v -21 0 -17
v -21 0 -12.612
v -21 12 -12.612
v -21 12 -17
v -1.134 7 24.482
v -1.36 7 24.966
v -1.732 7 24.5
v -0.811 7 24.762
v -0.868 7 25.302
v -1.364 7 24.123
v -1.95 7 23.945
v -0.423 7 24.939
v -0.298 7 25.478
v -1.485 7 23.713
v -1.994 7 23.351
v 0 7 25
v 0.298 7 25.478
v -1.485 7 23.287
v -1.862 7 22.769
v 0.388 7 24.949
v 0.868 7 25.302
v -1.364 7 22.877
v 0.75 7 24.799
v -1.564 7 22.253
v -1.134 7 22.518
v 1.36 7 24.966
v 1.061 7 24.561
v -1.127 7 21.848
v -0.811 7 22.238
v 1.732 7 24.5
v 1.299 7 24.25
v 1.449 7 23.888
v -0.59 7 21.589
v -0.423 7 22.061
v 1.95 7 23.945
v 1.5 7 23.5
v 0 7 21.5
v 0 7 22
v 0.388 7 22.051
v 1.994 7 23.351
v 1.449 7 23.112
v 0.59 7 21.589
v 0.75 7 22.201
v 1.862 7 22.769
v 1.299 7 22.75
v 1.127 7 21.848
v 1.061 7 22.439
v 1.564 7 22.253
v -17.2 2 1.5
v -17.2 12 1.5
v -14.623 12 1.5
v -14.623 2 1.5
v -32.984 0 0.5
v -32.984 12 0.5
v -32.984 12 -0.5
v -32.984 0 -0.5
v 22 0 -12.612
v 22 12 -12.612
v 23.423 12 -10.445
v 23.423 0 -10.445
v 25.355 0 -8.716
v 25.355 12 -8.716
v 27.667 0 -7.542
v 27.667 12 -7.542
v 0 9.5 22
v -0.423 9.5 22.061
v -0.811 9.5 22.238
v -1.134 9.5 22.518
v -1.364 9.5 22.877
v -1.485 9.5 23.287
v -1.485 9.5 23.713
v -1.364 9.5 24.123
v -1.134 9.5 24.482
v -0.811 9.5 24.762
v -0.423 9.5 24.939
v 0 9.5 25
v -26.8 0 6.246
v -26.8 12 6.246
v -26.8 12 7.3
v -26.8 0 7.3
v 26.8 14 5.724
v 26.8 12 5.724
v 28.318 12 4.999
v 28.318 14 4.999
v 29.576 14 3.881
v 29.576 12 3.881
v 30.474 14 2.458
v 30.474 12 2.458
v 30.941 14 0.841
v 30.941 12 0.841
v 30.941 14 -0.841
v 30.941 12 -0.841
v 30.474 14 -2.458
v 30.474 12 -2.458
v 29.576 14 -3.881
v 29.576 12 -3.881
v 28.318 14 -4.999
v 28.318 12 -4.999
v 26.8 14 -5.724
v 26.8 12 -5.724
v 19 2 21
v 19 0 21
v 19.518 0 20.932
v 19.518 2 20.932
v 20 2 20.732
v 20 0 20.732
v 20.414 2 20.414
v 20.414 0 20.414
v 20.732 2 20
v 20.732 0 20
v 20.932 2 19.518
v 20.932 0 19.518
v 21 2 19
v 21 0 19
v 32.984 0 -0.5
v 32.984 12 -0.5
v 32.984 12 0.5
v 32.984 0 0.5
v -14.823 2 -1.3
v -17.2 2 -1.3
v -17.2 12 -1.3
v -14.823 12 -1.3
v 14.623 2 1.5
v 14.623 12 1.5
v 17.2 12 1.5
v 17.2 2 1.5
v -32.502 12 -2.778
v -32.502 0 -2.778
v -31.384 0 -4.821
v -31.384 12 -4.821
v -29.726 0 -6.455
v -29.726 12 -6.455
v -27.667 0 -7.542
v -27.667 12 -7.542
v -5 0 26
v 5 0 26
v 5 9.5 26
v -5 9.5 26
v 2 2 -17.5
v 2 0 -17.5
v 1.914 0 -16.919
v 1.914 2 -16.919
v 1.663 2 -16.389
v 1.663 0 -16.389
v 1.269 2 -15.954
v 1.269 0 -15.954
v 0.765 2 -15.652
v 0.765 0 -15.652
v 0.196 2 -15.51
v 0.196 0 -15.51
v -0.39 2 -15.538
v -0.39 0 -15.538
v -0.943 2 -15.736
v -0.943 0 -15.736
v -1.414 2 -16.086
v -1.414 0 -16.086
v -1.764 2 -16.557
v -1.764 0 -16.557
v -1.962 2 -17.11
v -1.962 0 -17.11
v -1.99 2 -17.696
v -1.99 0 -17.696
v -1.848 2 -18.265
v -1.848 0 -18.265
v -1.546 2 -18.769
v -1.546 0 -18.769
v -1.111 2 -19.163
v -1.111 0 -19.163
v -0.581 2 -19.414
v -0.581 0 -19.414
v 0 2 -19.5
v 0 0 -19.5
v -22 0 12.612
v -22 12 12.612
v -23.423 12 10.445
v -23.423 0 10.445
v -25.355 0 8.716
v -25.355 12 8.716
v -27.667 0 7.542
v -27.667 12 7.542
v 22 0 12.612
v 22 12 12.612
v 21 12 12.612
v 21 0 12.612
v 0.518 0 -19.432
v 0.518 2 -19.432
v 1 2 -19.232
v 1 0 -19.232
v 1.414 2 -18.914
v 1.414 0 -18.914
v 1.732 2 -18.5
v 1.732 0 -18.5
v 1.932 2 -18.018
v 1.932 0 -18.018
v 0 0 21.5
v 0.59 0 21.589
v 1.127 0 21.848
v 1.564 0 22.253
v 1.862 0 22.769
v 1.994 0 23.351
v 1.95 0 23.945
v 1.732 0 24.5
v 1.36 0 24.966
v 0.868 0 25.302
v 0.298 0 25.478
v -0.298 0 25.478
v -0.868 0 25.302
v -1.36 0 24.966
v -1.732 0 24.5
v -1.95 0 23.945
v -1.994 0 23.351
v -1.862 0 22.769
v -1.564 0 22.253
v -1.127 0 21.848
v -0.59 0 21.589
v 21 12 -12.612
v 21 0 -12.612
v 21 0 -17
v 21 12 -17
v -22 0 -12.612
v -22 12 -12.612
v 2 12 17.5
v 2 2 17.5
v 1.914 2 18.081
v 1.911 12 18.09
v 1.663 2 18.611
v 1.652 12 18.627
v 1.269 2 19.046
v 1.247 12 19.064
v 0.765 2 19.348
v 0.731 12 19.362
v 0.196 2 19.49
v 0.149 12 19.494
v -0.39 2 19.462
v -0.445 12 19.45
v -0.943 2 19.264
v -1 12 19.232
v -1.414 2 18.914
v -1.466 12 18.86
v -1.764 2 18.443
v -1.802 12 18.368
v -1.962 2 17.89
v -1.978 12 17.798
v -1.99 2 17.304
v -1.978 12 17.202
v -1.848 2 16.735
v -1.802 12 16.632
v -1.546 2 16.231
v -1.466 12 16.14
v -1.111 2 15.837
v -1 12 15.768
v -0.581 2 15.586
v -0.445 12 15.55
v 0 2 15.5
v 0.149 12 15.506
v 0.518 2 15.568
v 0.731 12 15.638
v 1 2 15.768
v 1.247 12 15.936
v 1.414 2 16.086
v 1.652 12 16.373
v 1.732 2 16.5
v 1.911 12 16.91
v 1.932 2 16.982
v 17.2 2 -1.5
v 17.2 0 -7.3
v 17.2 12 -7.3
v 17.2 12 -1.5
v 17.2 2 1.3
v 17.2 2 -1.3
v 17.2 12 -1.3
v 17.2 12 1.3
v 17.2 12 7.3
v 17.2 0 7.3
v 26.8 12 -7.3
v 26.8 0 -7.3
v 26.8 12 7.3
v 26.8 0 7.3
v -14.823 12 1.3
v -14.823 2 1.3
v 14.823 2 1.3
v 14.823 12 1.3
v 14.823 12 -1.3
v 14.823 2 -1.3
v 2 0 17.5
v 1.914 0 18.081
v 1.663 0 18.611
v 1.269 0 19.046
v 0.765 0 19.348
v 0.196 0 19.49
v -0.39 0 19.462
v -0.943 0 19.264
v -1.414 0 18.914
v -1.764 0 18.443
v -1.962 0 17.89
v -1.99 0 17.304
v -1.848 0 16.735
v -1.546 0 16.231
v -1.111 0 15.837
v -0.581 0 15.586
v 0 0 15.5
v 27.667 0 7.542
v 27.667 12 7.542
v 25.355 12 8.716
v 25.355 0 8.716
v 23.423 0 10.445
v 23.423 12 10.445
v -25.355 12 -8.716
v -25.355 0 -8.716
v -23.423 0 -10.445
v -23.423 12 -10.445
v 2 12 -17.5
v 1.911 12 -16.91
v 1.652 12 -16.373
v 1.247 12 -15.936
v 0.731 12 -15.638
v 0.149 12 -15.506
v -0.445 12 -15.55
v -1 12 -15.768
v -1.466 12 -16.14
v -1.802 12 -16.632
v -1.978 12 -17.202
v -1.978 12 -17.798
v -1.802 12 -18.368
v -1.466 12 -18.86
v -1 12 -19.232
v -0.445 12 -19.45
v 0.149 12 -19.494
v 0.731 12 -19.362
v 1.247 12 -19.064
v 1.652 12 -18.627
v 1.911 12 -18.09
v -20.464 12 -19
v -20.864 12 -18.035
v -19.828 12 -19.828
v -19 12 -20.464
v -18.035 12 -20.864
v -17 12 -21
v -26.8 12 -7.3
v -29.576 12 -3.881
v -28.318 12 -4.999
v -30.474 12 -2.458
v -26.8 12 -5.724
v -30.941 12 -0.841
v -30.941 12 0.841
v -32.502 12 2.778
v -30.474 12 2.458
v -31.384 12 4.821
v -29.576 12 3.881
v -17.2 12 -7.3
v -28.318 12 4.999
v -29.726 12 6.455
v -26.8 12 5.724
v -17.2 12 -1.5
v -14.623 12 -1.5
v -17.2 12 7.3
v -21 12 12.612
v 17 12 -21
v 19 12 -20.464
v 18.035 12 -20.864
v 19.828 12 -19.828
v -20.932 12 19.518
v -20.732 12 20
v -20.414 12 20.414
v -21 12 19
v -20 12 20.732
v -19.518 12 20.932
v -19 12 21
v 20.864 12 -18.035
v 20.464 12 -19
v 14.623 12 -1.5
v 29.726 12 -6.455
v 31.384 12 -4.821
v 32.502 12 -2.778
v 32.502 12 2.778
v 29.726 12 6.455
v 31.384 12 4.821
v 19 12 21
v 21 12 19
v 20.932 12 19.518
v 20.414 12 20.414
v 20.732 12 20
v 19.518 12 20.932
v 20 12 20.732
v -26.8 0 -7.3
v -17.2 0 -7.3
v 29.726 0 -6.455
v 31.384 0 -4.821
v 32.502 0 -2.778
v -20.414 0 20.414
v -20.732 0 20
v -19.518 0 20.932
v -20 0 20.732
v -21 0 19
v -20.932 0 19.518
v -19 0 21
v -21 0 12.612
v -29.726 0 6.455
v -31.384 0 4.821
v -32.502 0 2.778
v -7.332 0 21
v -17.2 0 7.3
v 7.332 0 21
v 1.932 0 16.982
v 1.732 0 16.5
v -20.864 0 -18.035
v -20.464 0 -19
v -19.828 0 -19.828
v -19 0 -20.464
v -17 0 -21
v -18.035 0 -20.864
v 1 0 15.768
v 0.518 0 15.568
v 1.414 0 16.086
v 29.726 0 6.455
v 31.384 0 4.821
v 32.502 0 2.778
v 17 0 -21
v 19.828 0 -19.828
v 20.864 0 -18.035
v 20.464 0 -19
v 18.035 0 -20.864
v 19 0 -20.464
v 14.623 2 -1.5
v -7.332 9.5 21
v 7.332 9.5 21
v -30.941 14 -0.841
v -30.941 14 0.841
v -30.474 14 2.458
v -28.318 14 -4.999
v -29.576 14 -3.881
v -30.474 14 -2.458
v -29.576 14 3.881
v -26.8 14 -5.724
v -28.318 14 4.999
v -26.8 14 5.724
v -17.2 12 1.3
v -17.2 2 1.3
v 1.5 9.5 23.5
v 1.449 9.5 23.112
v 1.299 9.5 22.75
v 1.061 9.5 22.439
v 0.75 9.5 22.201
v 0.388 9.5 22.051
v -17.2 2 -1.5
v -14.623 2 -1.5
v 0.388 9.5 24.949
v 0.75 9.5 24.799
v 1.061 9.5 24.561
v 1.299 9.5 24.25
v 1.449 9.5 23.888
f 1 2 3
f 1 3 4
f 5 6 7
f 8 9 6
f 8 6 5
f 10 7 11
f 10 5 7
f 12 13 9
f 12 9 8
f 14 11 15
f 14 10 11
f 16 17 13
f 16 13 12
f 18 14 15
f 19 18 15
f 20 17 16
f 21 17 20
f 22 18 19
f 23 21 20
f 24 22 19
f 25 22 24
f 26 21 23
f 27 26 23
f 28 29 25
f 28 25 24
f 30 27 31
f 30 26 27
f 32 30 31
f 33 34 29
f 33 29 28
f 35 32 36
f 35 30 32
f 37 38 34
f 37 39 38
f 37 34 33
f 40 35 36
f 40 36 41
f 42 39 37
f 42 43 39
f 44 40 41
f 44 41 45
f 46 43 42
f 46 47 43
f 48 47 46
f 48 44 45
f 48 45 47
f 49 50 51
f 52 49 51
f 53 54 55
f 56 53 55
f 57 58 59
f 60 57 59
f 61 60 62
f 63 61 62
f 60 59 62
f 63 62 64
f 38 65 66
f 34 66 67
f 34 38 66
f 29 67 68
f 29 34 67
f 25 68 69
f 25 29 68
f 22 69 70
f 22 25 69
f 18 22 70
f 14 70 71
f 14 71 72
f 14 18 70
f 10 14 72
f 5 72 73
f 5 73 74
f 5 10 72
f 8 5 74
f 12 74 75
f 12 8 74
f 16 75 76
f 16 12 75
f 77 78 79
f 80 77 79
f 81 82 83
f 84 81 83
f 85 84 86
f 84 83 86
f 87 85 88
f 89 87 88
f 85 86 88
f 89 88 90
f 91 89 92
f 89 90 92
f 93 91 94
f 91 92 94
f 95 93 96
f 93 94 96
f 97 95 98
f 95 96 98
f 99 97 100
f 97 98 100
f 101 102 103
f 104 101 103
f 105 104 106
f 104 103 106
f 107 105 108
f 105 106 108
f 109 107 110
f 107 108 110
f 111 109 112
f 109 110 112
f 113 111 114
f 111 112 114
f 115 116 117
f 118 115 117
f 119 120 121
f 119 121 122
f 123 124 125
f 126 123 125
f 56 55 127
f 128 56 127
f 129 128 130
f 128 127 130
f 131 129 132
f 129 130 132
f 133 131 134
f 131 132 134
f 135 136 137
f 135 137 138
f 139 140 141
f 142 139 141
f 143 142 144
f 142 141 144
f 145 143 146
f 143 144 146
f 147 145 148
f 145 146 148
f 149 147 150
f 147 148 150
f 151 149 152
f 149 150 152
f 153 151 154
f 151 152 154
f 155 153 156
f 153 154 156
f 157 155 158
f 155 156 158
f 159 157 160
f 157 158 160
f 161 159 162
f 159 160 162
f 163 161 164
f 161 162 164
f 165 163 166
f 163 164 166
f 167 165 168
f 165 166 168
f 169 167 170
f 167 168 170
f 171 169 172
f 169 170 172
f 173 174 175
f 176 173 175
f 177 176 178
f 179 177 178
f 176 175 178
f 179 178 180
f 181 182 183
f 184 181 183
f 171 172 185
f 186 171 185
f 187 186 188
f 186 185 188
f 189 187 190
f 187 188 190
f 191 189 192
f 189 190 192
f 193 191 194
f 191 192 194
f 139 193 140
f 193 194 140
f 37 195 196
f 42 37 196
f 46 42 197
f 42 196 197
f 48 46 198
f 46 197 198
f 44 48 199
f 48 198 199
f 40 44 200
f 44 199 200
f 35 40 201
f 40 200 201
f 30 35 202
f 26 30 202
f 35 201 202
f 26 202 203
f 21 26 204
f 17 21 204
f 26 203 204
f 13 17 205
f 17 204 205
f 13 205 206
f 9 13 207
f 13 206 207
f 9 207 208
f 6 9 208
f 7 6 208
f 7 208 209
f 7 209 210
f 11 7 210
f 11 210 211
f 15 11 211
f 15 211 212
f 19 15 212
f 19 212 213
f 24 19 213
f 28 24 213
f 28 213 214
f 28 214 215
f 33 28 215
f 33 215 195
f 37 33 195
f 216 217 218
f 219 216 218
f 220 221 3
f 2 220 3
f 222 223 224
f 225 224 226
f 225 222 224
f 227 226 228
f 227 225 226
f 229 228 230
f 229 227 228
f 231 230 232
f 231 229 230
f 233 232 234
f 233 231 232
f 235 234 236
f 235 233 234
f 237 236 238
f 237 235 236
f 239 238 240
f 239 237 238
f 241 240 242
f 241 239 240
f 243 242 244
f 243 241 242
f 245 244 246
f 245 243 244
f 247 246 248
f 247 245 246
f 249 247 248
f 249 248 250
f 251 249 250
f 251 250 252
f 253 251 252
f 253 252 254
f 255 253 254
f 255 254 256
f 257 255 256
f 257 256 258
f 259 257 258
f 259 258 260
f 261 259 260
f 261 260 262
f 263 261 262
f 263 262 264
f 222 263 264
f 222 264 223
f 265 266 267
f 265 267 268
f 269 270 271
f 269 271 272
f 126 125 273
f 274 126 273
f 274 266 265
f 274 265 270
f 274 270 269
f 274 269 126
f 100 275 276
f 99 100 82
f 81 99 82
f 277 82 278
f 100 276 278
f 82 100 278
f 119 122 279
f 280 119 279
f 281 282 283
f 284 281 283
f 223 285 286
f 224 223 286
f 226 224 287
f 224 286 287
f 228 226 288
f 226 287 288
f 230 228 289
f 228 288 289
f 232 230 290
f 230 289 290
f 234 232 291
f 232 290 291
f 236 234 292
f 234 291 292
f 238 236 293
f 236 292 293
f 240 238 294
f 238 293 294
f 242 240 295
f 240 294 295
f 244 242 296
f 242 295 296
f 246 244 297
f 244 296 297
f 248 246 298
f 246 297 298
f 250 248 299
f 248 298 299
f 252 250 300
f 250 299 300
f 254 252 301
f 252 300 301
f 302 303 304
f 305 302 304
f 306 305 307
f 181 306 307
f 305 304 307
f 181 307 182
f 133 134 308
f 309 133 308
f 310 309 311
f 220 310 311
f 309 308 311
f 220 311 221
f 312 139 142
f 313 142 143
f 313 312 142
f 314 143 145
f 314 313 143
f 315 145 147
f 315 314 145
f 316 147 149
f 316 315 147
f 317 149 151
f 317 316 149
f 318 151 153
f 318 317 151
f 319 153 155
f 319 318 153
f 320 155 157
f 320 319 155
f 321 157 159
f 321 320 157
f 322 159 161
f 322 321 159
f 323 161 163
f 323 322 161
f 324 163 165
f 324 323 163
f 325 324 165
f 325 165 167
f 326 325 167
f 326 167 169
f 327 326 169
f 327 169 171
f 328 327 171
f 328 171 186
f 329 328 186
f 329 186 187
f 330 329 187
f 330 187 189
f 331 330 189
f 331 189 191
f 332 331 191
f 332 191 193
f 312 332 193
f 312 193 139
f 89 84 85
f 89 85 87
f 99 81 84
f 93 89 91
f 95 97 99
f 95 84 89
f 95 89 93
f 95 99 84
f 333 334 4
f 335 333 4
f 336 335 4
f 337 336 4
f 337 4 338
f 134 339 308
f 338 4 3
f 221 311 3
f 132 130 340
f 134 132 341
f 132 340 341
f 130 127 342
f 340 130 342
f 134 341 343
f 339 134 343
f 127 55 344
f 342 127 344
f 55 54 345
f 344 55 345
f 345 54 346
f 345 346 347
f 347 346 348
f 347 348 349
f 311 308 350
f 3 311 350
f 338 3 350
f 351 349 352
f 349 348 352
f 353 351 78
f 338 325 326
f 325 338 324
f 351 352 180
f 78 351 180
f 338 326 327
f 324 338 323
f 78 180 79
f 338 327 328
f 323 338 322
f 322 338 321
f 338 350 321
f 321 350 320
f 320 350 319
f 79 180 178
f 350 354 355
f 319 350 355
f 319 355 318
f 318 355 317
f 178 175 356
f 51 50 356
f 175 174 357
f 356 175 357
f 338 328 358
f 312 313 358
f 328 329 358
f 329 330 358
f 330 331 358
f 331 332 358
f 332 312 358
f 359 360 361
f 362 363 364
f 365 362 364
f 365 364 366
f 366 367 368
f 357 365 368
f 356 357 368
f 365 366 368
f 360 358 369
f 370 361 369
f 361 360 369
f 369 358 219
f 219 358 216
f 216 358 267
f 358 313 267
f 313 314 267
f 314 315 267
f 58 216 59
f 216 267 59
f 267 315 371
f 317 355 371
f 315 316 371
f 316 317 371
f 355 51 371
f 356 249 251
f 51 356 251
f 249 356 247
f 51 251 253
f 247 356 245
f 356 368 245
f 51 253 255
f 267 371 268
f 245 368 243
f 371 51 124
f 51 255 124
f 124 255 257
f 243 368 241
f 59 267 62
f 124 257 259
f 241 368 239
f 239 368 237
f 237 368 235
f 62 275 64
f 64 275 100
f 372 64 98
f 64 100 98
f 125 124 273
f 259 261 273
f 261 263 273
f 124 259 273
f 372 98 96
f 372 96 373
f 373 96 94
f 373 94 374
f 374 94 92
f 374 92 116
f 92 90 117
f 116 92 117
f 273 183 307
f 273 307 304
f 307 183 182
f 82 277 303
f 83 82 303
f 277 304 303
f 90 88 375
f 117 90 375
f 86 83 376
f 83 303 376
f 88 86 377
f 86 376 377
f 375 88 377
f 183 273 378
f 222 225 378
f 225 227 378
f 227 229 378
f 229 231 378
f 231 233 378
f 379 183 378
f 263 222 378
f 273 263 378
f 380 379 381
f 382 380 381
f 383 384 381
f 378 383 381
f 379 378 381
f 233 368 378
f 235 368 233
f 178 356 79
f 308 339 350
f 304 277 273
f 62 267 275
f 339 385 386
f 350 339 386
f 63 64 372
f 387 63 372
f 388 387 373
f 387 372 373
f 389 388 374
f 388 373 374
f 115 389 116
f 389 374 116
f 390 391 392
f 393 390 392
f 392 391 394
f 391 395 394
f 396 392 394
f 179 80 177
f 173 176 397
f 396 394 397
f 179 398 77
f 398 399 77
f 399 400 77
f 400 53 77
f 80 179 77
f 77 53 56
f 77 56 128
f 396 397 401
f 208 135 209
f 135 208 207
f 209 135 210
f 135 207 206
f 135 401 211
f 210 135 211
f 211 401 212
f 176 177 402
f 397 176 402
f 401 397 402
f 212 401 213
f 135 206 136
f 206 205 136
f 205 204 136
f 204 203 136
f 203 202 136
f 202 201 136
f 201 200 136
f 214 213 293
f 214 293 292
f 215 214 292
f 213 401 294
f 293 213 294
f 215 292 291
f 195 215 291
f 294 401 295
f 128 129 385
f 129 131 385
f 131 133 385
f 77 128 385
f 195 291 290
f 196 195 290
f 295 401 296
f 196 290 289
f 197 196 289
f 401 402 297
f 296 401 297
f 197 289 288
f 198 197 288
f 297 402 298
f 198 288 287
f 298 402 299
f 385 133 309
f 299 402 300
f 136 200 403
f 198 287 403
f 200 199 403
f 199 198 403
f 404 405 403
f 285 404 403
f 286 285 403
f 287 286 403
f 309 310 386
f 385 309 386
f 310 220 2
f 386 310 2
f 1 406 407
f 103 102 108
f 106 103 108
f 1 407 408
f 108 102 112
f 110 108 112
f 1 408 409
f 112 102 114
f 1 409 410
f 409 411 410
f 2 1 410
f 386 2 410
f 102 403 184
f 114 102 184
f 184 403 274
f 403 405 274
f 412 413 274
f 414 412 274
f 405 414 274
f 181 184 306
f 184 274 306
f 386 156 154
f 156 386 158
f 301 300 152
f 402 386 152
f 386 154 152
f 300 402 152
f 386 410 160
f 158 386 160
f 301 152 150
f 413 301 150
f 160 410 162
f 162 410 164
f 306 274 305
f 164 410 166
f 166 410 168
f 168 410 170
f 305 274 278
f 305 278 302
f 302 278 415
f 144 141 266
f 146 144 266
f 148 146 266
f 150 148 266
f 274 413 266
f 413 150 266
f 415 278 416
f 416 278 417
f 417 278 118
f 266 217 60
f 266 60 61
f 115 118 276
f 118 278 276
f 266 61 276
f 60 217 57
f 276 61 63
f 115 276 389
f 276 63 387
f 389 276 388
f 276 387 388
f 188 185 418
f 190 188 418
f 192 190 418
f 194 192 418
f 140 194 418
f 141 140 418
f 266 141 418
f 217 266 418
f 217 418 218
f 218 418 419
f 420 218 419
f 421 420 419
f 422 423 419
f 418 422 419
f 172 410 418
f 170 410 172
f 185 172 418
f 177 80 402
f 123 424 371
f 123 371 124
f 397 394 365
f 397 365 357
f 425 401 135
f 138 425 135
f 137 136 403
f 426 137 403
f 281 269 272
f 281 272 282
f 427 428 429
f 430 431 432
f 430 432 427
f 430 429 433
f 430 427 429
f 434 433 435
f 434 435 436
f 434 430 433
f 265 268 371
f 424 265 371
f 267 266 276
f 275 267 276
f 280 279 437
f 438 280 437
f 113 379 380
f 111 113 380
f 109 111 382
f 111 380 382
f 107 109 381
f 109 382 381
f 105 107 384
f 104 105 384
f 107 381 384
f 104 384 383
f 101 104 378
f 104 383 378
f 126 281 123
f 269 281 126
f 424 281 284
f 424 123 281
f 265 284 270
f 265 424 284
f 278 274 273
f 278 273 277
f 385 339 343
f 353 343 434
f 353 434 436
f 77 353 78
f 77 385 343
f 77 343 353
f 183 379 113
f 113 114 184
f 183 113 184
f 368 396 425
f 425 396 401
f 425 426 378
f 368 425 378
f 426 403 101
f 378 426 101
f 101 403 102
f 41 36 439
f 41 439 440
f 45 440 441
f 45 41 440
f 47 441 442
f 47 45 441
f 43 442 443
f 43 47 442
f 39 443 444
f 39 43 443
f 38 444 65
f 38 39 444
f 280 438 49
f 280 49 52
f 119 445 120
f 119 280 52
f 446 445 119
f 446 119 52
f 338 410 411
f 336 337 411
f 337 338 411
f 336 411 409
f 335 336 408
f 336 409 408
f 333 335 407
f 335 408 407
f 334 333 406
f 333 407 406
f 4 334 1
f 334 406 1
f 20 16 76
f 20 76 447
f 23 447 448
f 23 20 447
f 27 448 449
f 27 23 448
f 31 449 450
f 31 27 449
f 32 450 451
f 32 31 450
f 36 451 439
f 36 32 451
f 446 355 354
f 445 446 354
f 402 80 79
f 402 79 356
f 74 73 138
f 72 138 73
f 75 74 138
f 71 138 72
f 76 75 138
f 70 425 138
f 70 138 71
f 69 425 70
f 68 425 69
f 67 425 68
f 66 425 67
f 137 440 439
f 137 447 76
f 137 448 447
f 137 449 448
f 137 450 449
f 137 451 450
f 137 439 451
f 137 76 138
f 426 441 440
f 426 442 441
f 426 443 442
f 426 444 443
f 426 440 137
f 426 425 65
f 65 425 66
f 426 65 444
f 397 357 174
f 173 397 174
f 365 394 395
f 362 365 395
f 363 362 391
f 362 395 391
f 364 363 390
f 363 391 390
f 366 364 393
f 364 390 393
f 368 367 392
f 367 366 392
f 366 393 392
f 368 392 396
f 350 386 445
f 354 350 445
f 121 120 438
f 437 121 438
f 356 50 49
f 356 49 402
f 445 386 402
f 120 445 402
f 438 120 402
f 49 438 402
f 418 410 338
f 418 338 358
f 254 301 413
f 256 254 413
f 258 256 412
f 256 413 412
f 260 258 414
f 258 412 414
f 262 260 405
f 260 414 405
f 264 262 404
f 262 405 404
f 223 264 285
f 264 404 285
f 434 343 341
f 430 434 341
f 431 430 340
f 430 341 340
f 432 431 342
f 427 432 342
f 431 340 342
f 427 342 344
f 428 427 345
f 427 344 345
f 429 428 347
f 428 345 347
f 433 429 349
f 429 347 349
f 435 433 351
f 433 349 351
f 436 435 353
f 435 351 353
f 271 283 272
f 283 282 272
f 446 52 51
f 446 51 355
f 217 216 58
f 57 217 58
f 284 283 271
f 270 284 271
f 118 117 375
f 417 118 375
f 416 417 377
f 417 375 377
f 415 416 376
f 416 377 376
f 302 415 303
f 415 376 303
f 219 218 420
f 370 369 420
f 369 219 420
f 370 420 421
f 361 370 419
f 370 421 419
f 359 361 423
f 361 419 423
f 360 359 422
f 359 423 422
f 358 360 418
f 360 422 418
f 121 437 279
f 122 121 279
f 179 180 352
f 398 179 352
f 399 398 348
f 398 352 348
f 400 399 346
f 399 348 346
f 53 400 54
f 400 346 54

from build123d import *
from build123d.topology import SkipClean

# Parameters (mm, degrees)
SKETCH_1_W          = 42
SKETCH_1_H          = 42
EXTRUDE_1_DEPTH     = 2
EXTRUDE_2_DEPTH     = 0.5
SKETCH_3_R          = 2
SKETCH_3_R_2        = 1
CUT_EXTRUDE_1_DEPTH = 30.803523282
EXTRUDE_START       = -12
EXTRUDE_3_OUTLINE_R = 2
EXTRUDE_3_DEPTH     = 12
EXTRUDE_4_DEPTH     = 2
EXTRUDE_5_DEPTH     = 9.5
DRAFT_1_DEPTH       = 9.5
SKETCH_8_R          = 2
CUT_EXTRUDE_2_DEPTH = 7
CUT_EXTRUDE_3_REACH = 46.272
SKETCH_9_W          = 9.6
SKETCH_9_H          = 14.6
SKETCH_9_W_2        = 9
SKETCH_9_H_2        = 14


# Read off the part's stored shape, not the designer's step: Бобышка-Вытянуть3, Уклон1
with BuildPart() as part:
    # Эскиз1 → Бобышка-Вытянуть1 (new body)
    with BuildSketch(Plane(origin=(0, 0, 0), x_dir=(1, 0, 0), z_dir=(0, 1, 0))):
        Rectangle(SKETCH_1_W, SKETCH_1_H)
    extrude(amount=EXTRUDE_1_DEPTH)

    # Эскиз2 → Бобышка-Вытянуть2 (add)
    with BuildSketch(Plane(origin=(0, 2, 0), x_dir=(1, 0, 0), z_dir=(0, 1, 0))):
        with BuildLine():
            Line((-1.778376117, -14.123475383), (1.778376117, -14.123475383))
            ThreePointArc((1.778376117, -14.123475383), (15.863961031, -15.863961031), (14.123475383, -1.778376117))
            Line((14.123475383, -1.778376117), (14.123475383, 1.778376117))
            ThreePointArc((14.123475383, 1.778376117), (15.863961031, 15.863961031), (1.778376117, 14.123475383))
            Line((1.778376117, 14.123475383), (-1.778376117, 14.123475383))
            ThreePointArc((-1.778376117, 14.123475383), (-15.863961031, 15.863961031), (-14.123475383, 1.778376117))
            Line((-14.123475383, 1.778376117), (-14.123475383, -1.778376117))
            ThreePointArc((-14.123475383, -1.778376117), (-15.863961031, -15.863961031), (-1.778376117, -14.123475383))
        make_face()
    extrude(amount=EXTRUDE_2_DEPTH)

    # Эскиз3 → Вырез-Вытянуть1 (cut, through all)
    # profile 1 of 7: a face of its own
    with BuildSketch(Plane.XZ):
        with Locations(Location((0, -17.5, 0), (0, 0, 270))):
            Circle(SKETCH_3_R)
        with Locations((0, -17.5)):
            Circle(SKETCH_3_R_2, mode=Mode.SUBTRACT)
    # profile 2 of 7: a face of its own
    with BuildSketch(Plane.XZ):
        with BuildLine():
            Line((-21, -21), (-17, -21))
            ThreePointArc((-17, -21), (-19.828427125, -19.828427125), (-21, -17))
            Line((-21, -17), (-21, -21))
        make_face()
    # profile 3 of 7: a face of its own
    with BuildSketch(Plane.XZ):
        with BuildLine():
            ThreePointArc((21, -17), (19.828427125, -19.828427125), (17, -21))
            Line((17, -21), (21, -21))
            Line((21, -21), (21, -17))
        make_face()
    # profile 4 of 7: a face of its own
    with BuildSketch(Plane.XZ):
        with BuildLine():
            Line((21, 21), (19, 21))
            ThreePointArc((19, 21), (20.414213562, 20.414213562), (21, 19))
            Line((21, 19), (21, 21))
        make_face()
    # profile 5 of 7: a face of its own
    with BuildSketch(Plane.XZ):
        with Locations(Location((0, 17.5, 0), (0, 0, 270))):
            Circle(SKETCH_3_R)
        with Locations((0, 17.5)):
            Circle(SKETCH_3_R_2, mode=Mode.SUBTRACT)
    # profile 6 of 7: a face of its own
    with BuildSketch(Plane.XZ):
        with Locations((0, 17.5)):
            Circle(SKETCH_3_R_2)
    # profile 7 of 7: a face of its own
    with BuildSketch(Plane.XZ):
        with BuildLine():
            Line((-21, 21), (-21, 19))
            ThreePointArc((-21, 19), (-20.414213562, 20.414213562), (-19, 21))
            Line((-19, 21), (-21, 21))
        make_face()
    extrude(amount=-CUT_EXTRUDE_1_DEPTH, mode=Mode.SUBTRACT)


with BuildPart() as cut_extrude_1_kept_piece:
    # of the separate pieces the step leaves, the one the design keeps (cut_extrude_1_pieces_kept)
    add(part.part.solids().sort_by_distance((-19, 0, 21))[0])

    # Бобышка-Вытянуть3 outline → Бобышка-Вытянуть3 (add)
    with SkipClean():  # the faces are left unmerged after this step: merging them gives an invalid solid
        with BuildSketch(Plane.XZ.offset(EXTRUDE_START)):
            with BuildLine():
                Line((-22, -12.611663805), (-21, -12.611663805))
                Line((-21, -12.611663805), (-21, -17))
                ThreePointArc((-21, -17), (-19.828427125, -19.828427125), (-17, -21))
                Line((-17, -21), (17, -21))
                ThreePointArc((17, -21), (19.828427125, -19.828427125), (21, -17))
                Line((21, -17), (21, -12.611663805))
                Line((21, -12.611663805), (22, -12.611663805))
                ThreePointArc((22, -12.611663805), (24.332770191, -9.517506551), (27.666666667, -7.542472333))
                ThreePointArc((27.666666667, -7.542472333), (31.384371141, -4.820768106), (32.984359711, -0.5))
                Line((32.984359711, -0.5), (32.984359711, 0.5))
                ThreePointArc((32.984359711, 0.5), (31.384371141, 4.820768106), (27.666666667, 7.542472333))
                ThreePointArc((27.666666667, 7.542472333), (24.332770191, 9.517506551), (22, 12.611663805))
                Line((22, 12.611663805), (21, 12.611663805))
                Line((21, 12.611663805), (21, 19))
                ThreePointArc((21, 19), (20.414213562, 20.414213562), (19, 21))
                Line((19, 21), (-19, 21))
                ThreePointArc((-19, 21), (-20.414213562, 20.414213562), (-21, 19))
                Line((-21, 19), (-21, 12.611663805))
                Line((-21, 12.611663805), (-22, 12.611663805))
                ThreePointArc((-22, 12.611663805), (-24.332770191, 9.517506551), (-27.666666667, 7.542472333))
                ThreePointArc((-27.666666667, 7.542472333), (-31.384371141, 4.820768106), (-32.984359711, 0.5))
                Line((-32.984359711, 0.5), (-32.984359711, -0.5))
                ThreePointArc((-32.984359711, -0.5), (-31.384371141, -4.820768106), (-27.666666667, -7.542472333))
                ThreePointArc((-27.666666667, -7.542472333), (-24.332770191, -9.517506551), (-22, -12.611663805))
            make_face()
            with BuildLine():
                Line((-26.8, 7.3), (-21, 7.3))
                Line((-21, 7.3), (-21, 5.123475383))
                ThreePointArc((-21, 5.123475383), (-23.765130637, 6.381621867), (-26.8, 6.245798588))
                Line((-26.8, 6.245798588), (-26.8, 7.3))
            make_face(mode=Mode.SUBTRACT)
            with BuildLine():
                Line((14.623475383, -1.5), (14.623475383, 1.5))
                Line((14.623475383, 1.5), (18.67544468, 1.5))
                ThreePointArc((18.67544468, 1.5), (18.652597901, 1.400173775), (18.631326669, 1.3))
                Line((18.631326669, 1.3), (14.823475383, 1.3))
                Line((14.823475383, 1.3), (14.823475383, -1.3))
                Line((14.823475383, -1.3), (18.631326669, -1.3))
                ThreePointArc((18.631326669, -1.3), (18.652597901, -1.400173775), (18.67544468, -1.5))
                Line((18.67544468, -1.5), (14.623475383, -1.5))
            make_face(mode=Mode.SUBTRACT)
            with Locations((0, 17.5)):
                Circle(EXTRUDE_3_OUTLINE_R, mode=Mode.SUBTRACT)
            with Locations((0, -17.5)):
                Circle(EXTRUDE_3_OUTLINE_R, mode=Mode.SUBTRACT)
            with BuildLine():
                Line((-14.623475383, -1.5), (-18.67544468, -1.5))
                ThreePointArc((-18.67544468, -1.5), (-18.652597901, -1.400173775), (-18.631326669, -1.3))
                Line((-18.631326669, -1.3), (-14.823475383, -1.3))
                Line((-14.823475383, -1.3), (-14.823475383, 1.3))
                Line((-14.823475383, 1.3), (-18.631326669, 1.3))
                ThreePointArc((-18.631326669, 1.3), (-18.652597901, 1.400173775), (-18.67544468, 1.5))
                Line((-18.67544468, 1.5), (-14.623475383, 1.5))
                Line((-14.623475383, 1.5), (-14.623475383, -1.5))
            make_face(mode=Mode.SUBTRACT)
        extrude(amount=EXTRUDE_3_DEPTH)

    # Эскиз6 → Бобышка-Вытянуть4 (add)
    with SkipClean():  # the faces are left unmerged after this step: merging them gives an invalid solid
        with BuildSketch(Plane(origin=(0, 12, 0), x_dir=(1, 0, 0), z_dir=(0, 1, 0))):
            with BuildLine():
                ThreePointArc((-19.161948935, -1.384615385), (-19, 0), (-19.161948935, 1.384615385))
                ThreePointArc((-19.161948935, 1.384615385), (-19.949874575, 3.239789066), (-21.307692308, 4.729361892))
                ThreePointArc((-21.307692308, 4.729361892), (-31, 0), (-21.307692308, -4.729361892))
                ThreePointArc((-21.307692308, -4.729361892), (-19.949874575, -3.239789066), (-19.161948935, -1.384615385))
            make_face()
            with BuildLine():
                ThreePointArc((19.161948935, 1.384615385), (19, 0), (19.161948935, -1.384615385))
                ThreePointArc((19.161948935, -1.384615385), (19.949874575, -3.239789066), (21.307692308, -4.729361892))
                ThreePointArc((21.307692308, -4.729361892), (31, 0), (21.307692308, 4.729361892))
                ThreePointArc((21.307692308, 4.729361892), (19.949874575, 3.239789066), (19.161948935, 1.384615385))
            make_face()
        extrude(amount=EXTRUDE_4_DEPTH)

    # Эскиз7 → Бобышка-Вытянуть5 (add)
    with SkipClean():  # the faces are left unmerged after this step: merging them gives an invalid solid
        with BuildSketch(Plane.XZ):
            with BuildLine():
                Line((0, 22), (0, 21))
                Line((0, 21), (5, 21))
                Line((5, 21), (5, 26))
                Line((5, 26), (0, 26))
                Line((0, 26), (0, 25))
                ThreePointArc((0, 25), (1.060660172, 24.560660172), (1.5, 23.5))
                ThreePointArc((1.5, 23.5), (1.060660172, 22.439339828), (0, 22))
            make_face()
            with BuildLine():
                Line((-5, 21), (0, 21))
                Line((0, 21), (0, 22))
                ThreePointArc((0, 22), (-1.5, 23.5), (0, 25))
                Line((0, 25), (0, 26))
                Line((0, 26), (-5, 26))
                Line((-5, 26), (-5, 21))
            make_face()
        extrude(amount=-EXTRUDE_5_DEPTH)

    # Уклон1 outline → Уклон1 (add)
    with SkipClean():  # the faces are left unmerged after this step: merging them gives an invalid solid
        with BuildSketch(Plane(origin=(0, 0, 0), x_dir=(1, 0, 0), z_dir=(0, 1, 0))):
            Polygon((-5, -21), (-7.331538291, -21), (-5, -26), align=None)
            Polygon((7.331538291, -21), (5, -21), (5, -26), align=None)
        extrude(amount=DRAFT_1_DEPTH)

    # Эскиз8 → Вырез-Вытянуть2 (cut)
    with SkipClean():  # the faces are left unmerged after this step: merging them gives an invalid solid
        with BuildSketch(Plane.XZ):
            with Locations(Location((0, 23.5, 0), (0, 0, 270))):
                Circle(SKETCH_8_R)
        extrude(amount=-CUT_EXTRUDE_2_DEPTH, mode=Mode.SUBTRACT)

    # Эскиз9 → Вырез-Вытянуть3 (cut, up to next)
    with BuildSketch(Plane.XZ, mode=Mode.PRIVATE) as cut_extrude_3_sk1:
        with Locations((-22, 0)):
            Rectangle(SKETCH_9_W, SKETCH_9_H)
        with Locations((-22, 0)):
            Rectangle(SKETCH_9_W_2, SKETCH_9_H_2, mode=Mode.SUBTRACT)
    cut_extrude_3_tool1 = extrude(cut_extrude_3_sk1.sketch, amount=-CUT_EXTRUDE_3_REACH, mode=Mode.PRIVATE) & cut_extrude_1_kept_piece.part
    # Эскиз9 → Вырез-Вытянуть3 (cut, up to next)
    with BuildSketch(Plane.XZ, mode=Mode.PRIVATE) as cut_extrude_3_sk2:
        with Locations((-22, 0)):
            Rectangle(SKETCH_9_W_2, SKETCH_9_H_2)
    cut_extrude_3_tool2 = extrude(cut_extrude_3_sk2.sketch, amount=-CUT_EXTRUDE_3_REACH, mode=Mode.PRIVATE) & cut_extrude_1_kept_piece.part
    # Эскиз9 → Вырез-Вытянуть3 (cut, up to next)
    with BuildSketch(Plane.XZ, mode=Mode.PRIVATE) as cut_extrude_3_sk3:
        with Locations((22, 0)):
            Rectangle(SKETCH_9_W, SKETCH_9_H)
        with Locations((22, 0)):
            Rectangle(SKETCH_9_W_2, SKETCH_9_H_2, mode=Mode.SUBTRACT)
    cut_extrude_3_tool3 = extrude(cut_extrude_3_sk3.sketch, amount=-CUT_EXTRUDE_3_REACH, mode=Mode.PRIVATE) & cut_extrude_1_kept_piece.part
    # Эскиз9 → Вырез-Вытянуть3 (cut, up to next)
    with BuildSketch(Plane.XZ, mode=Mode.PRIVATE) as cut_extrude_3_sk4:
        with Locations((22, 0)):
            Rectangle(SKETCH_9_W_2, SKETCH_9_H_2)
    cut_extrude_3_tool4 = extrude(cut_extrude_3_sk4.sketch, amount=-CUT_EXTRUDE_3_REACH, mode=Mode.PRIVATE) & cut_extrude_1_kept_piece.part
    add(cut_extrude_3_tool1.solids().sort_by_distance((-26.625266, 0, 0))[0], mode=Mode.SUBTRACT)
    add(cut_extrude_3_tool2.solids().sort_by_distance((-22, 0, 0))[0], mode=Mode.SUBTRACT)
    add(cut_extrude_3_tool3.solids().sort_by_distance((17.374734, 0, 0))[0], mode=Mode.SUBTRACT)
    add(cut_extrude_3_tool4.solids().sort_by_distance((22, 0, 0))[0], mode=Mode.SUBTRACT)


solid = cut_extrude_1_kept_piece.part
